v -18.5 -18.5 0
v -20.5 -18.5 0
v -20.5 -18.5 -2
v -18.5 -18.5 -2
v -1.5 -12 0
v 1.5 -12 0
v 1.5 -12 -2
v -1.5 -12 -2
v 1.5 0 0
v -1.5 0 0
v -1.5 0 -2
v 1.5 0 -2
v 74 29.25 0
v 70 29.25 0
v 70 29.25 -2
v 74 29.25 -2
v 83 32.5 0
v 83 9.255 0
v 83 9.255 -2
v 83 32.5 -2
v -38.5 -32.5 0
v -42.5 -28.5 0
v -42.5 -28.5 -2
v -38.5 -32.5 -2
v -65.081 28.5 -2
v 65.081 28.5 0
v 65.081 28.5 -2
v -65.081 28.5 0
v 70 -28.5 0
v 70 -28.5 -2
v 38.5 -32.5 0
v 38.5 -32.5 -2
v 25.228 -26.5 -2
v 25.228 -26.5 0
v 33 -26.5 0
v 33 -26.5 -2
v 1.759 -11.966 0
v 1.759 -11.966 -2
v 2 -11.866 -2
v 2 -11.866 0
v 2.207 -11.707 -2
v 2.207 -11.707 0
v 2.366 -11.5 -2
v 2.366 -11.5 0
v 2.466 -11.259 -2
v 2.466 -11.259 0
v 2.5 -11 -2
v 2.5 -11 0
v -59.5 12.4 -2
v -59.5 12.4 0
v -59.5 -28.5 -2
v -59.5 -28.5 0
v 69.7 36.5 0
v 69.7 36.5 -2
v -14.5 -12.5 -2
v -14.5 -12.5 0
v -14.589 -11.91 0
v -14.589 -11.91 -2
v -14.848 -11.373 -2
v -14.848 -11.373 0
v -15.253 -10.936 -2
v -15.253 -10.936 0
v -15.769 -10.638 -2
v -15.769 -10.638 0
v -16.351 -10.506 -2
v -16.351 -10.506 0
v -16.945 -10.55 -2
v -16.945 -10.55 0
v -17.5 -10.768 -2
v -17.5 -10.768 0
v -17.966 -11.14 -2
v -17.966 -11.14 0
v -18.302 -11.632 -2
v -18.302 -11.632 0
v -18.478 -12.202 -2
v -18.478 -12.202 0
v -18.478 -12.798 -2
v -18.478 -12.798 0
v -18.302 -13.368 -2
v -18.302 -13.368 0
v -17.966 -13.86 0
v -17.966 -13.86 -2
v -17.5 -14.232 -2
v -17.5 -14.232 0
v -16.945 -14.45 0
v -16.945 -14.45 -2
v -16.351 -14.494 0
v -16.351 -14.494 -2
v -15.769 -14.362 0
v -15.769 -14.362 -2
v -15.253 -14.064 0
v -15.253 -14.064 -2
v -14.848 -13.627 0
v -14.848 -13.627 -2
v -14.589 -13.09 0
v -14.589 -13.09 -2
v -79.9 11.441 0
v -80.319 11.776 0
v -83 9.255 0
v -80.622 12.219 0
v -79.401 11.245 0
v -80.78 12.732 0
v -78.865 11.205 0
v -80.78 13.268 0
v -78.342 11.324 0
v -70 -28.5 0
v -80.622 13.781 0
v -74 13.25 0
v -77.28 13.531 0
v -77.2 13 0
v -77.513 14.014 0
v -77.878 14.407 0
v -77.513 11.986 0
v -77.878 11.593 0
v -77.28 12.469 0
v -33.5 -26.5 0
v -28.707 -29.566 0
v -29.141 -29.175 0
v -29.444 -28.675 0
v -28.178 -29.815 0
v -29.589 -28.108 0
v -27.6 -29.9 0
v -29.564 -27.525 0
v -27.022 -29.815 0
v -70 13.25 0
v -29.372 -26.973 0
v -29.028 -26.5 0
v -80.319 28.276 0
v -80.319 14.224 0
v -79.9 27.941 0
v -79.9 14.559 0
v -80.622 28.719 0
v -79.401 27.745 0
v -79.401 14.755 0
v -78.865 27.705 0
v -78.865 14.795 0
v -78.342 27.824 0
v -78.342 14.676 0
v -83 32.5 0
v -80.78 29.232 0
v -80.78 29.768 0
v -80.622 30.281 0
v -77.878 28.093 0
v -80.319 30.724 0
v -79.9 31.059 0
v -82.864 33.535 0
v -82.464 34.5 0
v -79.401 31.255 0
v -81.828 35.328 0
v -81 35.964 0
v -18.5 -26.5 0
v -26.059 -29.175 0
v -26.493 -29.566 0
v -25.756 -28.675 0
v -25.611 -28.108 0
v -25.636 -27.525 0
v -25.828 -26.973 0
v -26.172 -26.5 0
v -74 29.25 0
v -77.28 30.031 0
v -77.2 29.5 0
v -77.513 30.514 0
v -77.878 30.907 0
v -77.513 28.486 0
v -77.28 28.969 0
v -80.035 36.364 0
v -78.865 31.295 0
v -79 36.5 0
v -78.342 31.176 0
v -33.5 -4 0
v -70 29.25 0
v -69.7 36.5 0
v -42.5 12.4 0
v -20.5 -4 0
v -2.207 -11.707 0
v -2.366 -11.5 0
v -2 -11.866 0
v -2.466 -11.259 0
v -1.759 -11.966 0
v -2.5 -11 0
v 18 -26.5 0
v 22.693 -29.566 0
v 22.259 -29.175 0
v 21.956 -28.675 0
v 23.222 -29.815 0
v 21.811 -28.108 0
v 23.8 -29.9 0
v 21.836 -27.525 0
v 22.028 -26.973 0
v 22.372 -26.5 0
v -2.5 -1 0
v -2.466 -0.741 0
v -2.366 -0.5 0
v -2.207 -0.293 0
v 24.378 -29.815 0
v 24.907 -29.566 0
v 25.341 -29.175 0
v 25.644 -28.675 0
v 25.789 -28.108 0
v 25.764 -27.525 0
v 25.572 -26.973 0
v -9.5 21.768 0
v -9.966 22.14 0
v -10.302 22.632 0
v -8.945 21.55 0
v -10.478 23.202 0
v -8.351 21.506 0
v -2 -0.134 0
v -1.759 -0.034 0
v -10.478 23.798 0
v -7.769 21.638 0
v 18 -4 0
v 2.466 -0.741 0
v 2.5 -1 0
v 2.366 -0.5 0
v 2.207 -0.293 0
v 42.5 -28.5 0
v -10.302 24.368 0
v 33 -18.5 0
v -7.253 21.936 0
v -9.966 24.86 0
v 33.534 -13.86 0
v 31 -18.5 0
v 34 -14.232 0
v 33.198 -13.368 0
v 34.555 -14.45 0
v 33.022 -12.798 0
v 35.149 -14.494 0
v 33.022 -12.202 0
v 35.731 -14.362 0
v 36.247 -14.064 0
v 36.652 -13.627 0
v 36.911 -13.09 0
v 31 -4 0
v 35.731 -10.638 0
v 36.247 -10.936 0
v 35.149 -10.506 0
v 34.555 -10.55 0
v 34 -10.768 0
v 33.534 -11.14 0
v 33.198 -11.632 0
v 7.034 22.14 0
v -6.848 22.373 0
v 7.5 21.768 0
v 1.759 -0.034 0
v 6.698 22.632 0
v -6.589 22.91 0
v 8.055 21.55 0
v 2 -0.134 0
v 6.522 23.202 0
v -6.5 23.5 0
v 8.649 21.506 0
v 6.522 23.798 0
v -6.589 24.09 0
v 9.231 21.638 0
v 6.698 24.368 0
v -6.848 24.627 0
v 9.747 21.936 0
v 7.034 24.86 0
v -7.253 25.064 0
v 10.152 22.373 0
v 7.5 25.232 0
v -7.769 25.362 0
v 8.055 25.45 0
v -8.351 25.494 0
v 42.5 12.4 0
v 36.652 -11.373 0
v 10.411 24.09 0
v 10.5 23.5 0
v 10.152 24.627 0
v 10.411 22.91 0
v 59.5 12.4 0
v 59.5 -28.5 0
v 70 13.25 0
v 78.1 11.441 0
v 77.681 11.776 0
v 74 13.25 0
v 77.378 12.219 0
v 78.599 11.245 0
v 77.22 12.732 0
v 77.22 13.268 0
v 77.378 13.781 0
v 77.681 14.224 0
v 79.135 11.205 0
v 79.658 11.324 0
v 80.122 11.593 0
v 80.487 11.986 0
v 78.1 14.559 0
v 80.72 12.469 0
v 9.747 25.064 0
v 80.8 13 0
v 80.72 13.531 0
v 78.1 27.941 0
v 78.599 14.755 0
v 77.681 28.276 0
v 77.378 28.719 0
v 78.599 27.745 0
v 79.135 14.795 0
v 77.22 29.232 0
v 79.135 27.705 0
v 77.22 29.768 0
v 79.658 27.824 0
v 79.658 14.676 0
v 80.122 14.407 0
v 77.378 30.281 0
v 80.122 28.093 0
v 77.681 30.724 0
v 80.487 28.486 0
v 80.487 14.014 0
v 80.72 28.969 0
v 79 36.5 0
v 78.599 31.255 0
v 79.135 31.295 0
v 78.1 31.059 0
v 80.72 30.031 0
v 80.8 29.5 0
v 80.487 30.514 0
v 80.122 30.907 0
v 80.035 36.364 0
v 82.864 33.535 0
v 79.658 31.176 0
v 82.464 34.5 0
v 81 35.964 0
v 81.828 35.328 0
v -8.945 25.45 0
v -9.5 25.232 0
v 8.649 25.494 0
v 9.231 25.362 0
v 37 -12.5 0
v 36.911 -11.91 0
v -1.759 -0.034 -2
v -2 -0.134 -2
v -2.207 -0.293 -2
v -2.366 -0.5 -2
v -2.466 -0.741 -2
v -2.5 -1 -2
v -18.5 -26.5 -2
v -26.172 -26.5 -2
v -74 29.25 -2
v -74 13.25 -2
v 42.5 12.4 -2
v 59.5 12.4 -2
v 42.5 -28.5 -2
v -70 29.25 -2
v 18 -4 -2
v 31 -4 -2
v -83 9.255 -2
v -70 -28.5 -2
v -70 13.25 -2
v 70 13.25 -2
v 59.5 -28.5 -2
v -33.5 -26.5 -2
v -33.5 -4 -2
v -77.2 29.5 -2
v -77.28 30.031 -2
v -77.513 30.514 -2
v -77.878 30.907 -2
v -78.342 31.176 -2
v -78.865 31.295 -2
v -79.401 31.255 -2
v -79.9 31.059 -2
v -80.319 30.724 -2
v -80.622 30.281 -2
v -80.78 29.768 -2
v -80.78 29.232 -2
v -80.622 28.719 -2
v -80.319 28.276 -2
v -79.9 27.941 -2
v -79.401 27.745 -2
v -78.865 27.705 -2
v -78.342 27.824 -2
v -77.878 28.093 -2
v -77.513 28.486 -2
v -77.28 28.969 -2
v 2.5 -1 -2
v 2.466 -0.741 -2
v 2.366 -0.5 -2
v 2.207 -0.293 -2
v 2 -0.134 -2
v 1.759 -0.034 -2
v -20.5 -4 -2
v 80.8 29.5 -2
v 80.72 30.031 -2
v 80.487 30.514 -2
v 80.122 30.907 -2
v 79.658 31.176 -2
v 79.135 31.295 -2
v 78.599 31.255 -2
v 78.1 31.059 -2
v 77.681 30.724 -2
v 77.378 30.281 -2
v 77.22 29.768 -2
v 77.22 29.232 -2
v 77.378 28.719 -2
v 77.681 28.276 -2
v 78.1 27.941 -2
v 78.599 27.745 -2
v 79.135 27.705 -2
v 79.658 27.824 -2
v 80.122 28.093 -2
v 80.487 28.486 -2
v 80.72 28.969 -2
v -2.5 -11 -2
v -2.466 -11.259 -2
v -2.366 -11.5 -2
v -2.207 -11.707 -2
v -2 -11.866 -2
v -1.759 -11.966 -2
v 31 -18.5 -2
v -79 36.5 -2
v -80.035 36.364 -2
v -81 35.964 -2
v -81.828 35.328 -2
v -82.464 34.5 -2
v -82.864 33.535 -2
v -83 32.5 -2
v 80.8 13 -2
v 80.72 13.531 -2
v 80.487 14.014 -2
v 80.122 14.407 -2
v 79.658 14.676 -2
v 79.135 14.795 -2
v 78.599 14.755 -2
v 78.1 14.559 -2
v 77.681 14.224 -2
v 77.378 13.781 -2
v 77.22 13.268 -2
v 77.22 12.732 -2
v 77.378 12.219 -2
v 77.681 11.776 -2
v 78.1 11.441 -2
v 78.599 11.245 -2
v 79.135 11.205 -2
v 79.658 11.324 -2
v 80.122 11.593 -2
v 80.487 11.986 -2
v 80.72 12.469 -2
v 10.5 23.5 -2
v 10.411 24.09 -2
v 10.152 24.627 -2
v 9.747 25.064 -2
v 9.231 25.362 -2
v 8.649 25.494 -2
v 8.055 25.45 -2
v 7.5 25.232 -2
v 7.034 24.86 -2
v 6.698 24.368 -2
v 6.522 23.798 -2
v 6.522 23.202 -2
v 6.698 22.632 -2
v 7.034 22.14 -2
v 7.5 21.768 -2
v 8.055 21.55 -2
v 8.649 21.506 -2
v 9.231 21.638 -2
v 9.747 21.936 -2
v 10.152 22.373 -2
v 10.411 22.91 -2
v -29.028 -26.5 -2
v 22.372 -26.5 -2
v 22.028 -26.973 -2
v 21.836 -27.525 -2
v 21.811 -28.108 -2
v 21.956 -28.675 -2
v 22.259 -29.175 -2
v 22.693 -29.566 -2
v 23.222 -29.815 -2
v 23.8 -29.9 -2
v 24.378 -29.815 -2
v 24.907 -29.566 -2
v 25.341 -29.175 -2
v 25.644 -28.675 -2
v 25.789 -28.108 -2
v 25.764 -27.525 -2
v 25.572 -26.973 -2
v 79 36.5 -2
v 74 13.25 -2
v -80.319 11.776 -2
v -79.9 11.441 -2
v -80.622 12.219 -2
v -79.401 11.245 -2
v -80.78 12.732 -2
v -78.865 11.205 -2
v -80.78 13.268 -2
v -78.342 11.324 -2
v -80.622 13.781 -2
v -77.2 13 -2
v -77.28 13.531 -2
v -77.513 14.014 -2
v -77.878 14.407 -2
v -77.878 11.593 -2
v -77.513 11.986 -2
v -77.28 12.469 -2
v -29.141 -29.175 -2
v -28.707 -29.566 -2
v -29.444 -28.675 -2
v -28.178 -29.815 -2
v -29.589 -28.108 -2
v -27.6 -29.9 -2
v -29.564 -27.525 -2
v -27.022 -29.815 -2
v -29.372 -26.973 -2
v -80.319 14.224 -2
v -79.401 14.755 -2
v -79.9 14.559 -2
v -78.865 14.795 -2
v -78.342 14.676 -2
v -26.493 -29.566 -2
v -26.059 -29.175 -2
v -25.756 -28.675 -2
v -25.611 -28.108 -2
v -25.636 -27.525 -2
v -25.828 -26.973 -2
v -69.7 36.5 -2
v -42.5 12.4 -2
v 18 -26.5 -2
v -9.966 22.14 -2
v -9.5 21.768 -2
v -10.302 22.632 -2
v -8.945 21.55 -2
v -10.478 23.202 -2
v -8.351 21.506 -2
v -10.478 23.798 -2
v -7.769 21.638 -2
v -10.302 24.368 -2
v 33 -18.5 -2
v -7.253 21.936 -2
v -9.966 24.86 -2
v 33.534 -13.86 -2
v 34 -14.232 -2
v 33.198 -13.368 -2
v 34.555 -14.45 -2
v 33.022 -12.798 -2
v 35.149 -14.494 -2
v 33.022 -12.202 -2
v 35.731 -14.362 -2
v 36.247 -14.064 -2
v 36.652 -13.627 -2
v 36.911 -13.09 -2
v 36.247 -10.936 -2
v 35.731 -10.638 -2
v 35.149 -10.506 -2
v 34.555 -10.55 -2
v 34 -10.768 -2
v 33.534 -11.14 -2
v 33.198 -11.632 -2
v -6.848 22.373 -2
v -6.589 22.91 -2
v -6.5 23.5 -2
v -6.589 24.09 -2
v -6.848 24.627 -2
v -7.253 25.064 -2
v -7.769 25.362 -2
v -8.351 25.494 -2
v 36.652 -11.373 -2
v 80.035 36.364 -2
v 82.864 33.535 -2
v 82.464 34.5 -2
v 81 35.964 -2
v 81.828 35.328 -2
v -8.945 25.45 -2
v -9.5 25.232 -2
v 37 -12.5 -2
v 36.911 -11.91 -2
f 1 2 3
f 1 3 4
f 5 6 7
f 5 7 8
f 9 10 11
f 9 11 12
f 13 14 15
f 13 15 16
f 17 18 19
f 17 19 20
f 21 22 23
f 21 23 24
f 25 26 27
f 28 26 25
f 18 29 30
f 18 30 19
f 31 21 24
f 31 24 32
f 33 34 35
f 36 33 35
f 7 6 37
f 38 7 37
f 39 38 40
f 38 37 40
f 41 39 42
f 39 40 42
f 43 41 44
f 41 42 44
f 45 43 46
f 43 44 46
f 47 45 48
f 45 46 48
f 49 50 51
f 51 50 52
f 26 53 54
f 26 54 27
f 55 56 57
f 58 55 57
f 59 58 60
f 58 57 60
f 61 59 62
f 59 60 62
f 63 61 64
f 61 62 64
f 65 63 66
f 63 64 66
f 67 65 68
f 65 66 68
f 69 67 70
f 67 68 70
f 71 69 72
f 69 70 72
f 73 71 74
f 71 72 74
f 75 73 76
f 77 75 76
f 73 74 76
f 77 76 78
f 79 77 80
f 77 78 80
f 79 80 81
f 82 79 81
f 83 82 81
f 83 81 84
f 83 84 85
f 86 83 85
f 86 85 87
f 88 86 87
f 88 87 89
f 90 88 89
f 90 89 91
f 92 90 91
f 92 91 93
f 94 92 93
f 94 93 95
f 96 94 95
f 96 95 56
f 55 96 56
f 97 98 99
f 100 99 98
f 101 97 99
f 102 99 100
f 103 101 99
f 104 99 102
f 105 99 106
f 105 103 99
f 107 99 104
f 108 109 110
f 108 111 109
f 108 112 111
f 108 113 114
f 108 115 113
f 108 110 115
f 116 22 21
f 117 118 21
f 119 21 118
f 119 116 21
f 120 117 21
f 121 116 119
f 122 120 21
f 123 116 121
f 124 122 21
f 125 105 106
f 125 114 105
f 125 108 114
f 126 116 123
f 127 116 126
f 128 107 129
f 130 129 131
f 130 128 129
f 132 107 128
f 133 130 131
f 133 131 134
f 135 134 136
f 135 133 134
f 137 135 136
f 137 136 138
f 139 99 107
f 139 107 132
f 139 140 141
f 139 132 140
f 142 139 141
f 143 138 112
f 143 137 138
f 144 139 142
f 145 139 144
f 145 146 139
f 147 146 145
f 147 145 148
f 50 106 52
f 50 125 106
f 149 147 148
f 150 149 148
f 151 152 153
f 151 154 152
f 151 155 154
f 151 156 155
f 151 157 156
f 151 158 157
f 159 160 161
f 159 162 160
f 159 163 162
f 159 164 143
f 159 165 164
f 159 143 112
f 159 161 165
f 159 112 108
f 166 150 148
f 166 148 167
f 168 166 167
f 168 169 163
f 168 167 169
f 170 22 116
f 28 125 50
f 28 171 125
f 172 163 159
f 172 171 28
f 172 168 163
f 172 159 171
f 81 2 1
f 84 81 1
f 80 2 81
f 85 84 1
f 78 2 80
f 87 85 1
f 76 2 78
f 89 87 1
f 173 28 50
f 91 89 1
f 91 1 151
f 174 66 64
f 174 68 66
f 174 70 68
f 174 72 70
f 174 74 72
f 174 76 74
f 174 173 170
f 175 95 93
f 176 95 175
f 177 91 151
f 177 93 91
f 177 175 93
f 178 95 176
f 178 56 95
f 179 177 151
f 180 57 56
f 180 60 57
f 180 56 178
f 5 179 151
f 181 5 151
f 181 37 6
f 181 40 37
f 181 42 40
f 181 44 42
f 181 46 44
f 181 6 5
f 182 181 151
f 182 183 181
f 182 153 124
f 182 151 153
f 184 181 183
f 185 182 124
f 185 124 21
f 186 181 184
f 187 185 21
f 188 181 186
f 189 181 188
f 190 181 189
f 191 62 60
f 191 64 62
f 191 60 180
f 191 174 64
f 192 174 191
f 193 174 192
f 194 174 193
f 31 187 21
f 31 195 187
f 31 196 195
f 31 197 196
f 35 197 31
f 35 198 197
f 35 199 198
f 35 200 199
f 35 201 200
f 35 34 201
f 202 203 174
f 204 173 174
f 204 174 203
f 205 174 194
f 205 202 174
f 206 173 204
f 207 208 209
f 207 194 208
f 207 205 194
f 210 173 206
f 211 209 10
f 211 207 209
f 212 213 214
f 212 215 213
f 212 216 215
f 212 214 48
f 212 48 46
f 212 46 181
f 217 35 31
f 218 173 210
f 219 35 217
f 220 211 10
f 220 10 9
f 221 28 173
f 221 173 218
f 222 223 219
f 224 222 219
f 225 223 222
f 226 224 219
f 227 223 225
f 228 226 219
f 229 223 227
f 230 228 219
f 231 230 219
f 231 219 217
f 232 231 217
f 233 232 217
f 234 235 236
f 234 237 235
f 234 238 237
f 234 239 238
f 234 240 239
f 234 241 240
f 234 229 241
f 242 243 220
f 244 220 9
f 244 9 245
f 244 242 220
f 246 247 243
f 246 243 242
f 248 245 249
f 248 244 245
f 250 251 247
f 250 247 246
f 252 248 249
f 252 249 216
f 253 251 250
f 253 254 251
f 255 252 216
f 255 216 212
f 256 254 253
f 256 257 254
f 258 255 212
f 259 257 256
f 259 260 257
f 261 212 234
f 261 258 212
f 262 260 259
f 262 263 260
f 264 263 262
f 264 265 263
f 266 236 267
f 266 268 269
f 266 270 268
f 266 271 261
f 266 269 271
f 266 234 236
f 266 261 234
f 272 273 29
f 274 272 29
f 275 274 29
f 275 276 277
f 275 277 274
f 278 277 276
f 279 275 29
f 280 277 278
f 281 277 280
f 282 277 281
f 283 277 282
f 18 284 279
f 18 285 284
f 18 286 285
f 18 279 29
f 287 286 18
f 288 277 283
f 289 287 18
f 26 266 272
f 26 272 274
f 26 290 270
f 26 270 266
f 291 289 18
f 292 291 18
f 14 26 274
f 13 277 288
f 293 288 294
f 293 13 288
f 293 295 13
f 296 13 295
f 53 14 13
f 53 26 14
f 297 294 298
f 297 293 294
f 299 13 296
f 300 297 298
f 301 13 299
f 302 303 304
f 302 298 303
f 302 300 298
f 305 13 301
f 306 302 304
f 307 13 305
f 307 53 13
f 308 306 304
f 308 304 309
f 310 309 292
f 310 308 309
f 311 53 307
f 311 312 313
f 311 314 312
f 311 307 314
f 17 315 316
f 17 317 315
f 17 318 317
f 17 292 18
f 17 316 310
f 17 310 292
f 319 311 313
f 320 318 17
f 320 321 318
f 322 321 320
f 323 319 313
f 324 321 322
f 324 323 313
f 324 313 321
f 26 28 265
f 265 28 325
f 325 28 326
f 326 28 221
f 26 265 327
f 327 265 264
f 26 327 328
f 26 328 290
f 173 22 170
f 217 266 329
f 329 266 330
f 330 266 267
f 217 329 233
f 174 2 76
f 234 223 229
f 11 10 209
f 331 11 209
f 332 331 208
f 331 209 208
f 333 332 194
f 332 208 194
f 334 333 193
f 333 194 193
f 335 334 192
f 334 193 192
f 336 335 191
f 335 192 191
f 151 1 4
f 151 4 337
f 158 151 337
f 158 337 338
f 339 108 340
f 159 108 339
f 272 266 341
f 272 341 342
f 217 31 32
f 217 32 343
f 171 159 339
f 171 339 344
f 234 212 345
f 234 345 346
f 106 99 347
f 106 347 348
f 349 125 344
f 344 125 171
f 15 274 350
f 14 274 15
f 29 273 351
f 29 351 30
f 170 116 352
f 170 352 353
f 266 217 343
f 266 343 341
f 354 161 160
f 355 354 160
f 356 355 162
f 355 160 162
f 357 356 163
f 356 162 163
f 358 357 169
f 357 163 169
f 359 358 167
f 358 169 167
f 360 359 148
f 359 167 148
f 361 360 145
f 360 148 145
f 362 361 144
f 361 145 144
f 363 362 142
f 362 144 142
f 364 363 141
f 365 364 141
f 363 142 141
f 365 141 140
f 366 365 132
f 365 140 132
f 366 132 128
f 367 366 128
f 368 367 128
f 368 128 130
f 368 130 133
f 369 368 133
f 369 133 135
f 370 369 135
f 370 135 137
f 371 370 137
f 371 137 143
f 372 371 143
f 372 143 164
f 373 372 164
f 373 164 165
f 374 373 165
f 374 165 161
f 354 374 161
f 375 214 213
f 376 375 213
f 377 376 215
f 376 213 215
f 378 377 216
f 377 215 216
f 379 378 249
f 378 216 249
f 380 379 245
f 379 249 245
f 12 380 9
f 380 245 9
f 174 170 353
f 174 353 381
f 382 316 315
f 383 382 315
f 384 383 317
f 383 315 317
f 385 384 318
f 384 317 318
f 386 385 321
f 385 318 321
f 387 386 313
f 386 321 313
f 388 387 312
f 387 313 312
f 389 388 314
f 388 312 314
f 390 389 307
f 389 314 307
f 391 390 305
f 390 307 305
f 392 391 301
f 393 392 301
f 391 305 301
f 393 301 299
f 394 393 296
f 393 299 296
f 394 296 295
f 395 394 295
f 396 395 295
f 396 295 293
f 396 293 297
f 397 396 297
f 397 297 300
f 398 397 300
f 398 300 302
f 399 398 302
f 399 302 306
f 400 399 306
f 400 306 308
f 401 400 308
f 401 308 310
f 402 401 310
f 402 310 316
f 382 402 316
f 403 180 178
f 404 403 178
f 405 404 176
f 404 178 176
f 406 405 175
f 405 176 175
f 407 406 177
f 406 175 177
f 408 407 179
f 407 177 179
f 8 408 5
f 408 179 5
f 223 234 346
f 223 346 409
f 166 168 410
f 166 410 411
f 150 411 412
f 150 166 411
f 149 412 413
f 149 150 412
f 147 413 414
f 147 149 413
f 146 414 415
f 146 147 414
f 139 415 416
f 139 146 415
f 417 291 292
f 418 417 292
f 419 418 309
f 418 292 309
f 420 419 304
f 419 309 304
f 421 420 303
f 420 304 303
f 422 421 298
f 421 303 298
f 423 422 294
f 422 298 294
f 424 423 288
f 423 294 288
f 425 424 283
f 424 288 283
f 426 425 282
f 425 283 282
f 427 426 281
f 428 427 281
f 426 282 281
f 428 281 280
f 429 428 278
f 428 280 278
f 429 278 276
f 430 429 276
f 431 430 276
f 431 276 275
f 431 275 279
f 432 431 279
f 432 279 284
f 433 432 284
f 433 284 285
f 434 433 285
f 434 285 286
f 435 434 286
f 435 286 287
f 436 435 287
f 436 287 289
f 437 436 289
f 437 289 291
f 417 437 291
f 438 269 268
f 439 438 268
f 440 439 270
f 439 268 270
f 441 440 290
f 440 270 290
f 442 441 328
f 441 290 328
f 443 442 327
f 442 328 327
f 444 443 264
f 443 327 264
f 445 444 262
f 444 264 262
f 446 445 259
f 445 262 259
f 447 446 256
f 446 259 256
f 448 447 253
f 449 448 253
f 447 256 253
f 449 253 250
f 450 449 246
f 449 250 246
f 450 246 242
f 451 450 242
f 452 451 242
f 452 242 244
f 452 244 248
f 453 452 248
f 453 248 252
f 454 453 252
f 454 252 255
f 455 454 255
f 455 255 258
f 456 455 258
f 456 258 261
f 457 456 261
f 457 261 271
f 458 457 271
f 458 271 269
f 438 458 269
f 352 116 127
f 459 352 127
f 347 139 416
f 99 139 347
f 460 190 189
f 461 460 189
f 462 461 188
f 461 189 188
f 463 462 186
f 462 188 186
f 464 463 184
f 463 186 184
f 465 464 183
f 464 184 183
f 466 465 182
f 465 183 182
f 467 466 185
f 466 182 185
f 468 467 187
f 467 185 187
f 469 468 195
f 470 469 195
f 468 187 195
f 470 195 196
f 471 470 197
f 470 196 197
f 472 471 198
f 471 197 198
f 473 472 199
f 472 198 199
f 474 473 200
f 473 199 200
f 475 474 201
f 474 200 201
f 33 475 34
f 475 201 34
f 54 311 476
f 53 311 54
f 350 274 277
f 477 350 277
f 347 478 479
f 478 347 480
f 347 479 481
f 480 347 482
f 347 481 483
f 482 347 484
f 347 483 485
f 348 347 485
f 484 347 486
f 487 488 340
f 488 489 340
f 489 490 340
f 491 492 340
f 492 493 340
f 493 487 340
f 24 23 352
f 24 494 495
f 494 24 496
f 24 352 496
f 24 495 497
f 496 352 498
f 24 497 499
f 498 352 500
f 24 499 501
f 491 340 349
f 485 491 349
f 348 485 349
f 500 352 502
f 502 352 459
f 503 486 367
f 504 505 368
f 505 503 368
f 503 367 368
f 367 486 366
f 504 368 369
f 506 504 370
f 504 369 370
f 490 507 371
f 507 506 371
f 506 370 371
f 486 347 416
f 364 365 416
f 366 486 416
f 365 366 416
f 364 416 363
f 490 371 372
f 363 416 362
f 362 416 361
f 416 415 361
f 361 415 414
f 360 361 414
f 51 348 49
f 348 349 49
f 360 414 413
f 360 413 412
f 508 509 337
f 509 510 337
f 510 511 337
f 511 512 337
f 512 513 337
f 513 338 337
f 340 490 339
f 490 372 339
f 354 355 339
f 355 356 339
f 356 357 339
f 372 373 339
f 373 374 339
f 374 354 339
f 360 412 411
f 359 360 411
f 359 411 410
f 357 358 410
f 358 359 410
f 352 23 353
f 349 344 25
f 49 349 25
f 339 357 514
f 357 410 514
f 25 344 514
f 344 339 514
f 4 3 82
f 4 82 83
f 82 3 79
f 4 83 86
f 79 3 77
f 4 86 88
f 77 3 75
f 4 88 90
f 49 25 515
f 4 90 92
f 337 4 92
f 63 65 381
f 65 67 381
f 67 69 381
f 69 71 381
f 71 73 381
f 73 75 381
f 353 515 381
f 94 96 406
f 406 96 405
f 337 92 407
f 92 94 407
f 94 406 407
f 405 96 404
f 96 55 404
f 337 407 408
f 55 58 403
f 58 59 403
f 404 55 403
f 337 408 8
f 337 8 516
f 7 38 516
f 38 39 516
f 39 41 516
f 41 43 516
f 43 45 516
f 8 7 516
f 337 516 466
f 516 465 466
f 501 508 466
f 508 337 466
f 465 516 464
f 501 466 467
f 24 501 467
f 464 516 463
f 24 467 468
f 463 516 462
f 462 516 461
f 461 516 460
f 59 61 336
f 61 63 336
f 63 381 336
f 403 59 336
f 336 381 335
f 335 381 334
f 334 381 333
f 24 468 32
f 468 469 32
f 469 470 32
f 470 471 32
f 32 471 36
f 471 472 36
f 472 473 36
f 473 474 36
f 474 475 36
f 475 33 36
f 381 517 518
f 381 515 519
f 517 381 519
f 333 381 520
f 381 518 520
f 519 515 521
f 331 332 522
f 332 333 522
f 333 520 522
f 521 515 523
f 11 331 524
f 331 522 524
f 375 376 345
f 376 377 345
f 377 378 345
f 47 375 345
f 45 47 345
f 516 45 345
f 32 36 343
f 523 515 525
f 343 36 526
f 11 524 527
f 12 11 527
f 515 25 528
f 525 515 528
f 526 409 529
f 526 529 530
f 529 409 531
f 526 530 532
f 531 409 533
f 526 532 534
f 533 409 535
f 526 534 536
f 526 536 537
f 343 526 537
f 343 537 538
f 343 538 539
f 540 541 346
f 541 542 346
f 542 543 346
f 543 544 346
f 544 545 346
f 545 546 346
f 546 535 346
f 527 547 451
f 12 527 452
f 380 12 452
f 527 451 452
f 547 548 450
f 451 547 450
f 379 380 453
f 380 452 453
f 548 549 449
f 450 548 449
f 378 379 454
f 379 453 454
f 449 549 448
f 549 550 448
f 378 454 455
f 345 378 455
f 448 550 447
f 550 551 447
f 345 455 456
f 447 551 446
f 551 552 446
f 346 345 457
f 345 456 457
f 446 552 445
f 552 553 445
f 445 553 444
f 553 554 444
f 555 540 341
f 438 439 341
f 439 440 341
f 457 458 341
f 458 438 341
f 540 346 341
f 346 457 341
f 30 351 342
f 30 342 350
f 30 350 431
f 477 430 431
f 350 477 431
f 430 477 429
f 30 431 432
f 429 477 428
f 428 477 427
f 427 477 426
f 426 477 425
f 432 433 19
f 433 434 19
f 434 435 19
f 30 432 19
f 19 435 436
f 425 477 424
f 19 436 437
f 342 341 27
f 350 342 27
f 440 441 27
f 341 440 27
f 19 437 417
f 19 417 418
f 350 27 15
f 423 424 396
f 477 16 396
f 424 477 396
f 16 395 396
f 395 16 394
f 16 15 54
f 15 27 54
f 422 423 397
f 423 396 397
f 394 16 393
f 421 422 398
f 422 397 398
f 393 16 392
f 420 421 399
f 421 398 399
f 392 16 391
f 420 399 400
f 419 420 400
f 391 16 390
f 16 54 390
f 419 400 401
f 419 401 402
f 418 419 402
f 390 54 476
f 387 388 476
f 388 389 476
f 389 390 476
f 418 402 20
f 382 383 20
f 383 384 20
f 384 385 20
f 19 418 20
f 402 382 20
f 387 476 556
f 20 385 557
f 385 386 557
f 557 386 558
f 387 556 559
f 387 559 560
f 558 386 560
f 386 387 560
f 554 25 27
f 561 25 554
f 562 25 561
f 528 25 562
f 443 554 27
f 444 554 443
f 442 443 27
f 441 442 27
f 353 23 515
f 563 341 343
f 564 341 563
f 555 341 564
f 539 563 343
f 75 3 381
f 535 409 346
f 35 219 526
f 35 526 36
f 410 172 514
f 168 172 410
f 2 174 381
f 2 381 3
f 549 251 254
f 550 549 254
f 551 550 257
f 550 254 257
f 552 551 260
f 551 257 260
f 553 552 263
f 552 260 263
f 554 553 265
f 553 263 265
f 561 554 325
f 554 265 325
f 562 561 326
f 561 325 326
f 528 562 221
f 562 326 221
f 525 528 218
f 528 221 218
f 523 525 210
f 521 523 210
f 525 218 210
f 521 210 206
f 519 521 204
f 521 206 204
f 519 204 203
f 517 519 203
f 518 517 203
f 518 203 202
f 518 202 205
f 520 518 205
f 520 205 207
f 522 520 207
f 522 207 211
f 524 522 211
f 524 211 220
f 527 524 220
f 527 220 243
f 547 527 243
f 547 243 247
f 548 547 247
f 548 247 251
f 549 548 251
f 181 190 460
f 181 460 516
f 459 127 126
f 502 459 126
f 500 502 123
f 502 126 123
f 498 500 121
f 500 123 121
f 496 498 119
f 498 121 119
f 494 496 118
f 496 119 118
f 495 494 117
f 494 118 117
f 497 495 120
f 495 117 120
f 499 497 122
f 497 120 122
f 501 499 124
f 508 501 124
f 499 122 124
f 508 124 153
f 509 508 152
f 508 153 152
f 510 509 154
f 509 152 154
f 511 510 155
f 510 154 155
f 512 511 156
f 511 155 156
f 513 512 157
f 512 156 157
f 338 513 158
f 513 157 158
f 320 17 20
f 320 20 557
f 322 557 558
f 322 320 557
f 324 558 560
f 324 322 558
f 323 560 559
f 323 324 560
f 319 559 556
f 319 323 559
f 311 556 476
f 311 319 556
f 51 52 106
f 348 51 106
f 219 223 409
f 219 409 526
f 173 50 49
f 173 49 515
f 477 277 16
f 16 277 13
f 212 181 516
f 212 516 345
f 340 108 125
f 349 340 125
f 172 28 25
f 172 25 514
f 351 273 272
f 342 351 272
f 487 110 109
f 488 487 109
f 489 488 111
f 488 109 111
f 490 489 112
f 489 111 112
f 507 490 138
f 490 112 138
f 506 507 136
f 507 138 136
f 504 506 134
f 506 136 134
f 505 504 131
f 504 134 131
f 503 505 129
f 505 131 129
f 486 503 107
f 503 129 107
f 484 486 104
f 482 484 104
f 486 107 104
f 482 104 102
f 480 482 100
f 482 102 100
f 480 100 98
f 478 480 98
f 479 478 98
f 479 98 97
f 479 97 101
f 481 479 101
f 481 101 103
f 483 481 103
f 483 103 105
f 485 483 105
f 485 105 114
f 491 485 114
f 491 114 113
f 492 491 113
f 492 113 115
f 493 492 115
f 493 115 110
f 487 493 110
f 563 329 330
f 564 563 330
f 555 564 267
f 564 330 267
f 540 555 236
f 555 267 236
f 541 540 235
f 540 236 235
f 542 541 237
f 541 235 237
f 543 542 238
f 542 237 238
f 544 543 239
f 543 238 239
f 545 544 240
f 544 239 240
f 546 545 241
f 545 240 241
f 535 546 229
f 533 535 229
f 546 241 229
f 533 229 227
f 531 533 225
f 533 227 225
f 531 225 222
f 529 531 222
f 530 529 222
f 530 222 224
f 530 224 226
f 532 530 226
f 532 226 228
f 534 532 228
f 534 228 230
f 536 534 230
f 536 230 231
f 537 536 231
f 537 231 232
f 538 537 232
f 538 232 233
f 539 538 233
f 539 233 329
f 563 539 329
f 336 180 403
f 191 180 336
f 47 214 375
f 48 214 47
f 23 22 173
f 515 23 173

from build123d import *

# Parameters (mm, degrees)
PAD_DEPTH          = 2
SKETCH001_R        = 1.8
SKETCH001_W        = 4
SKETCH001_H        = 16
POCKET_DEPTH       = 2.001
SKETCH002_R        = 2
POCKET001_DEPTH    = 2.001
SKETCH003_W        = 17
SKETCH003_H        = 43.9
POCKET002_DEPTH    = 2.001
SKETCH004_R        = 2
POCKET003_DEPTH    = 2.001
POCKET011002_DEPTH = 2.001


with BuildPart() as part:
    # Sketch → Pad (new body)
    with BuildSketch(Plane.XY):
        with BuildLine():
            Line((65.081198, 28.5), (-65.081198, 28.5))
            Line((-65.081198, 28.5), (-69.7, 36.5))
            Line((-69.7, 36.5), (-79, 36.5))
            ThreePointArc((-79, 36.5), (-81.828427, 35.328427), (-83, 32.5))
            Line((-83, 32.5), (-83, 9.254741))
            Line((-83, 9.254741), (-70, -28.5))
            Line((-42.5, -28.5), (-70, -28.5))
            Line((-42.5, -28.5), (-38.5, -32.5))
            Line((-38.5, -32.5), (38.5, -32.5))
            Line((38.5, -32.5), (42.5, -28.5))
            Line((42.5, -28.5), (70, -28.5))
            Line((70, -28.5), (83, 9.254741))
            Line((83, 9.254741), (83, 32.5))
            ThreePointArc((83, 32.5), (81.828427, 35.328427), (79, 36.5))
            Line((79, 36.5), (69.7, 36.5))
            Line((69.7, 36.5), (65.081198, 28.5))
        make_face()
    extrude(amount=-PAD_DEPTH)

    # Sketch001 → Pocket (cut, through all)
    with BuildSketch(Plane.XY):
        with Locations((-79, 29.5)):
            Circle(SKETCH001_R)
        with Locations((-79, 13)):
            Circle(SKETCH001_R)
        with Locations((79, 29.5)):
            Circle(SKETCH001_R)
        with Locations((79, 13)):
            Circle(SKETCH001_R)
        with Locations((-72, 21.25)):
            Rectangle(SKETCH001_W, SKETCH001_H)
        with Locations((72, 21.25)):
            Rectangle(SKETCH001_W, SKETCH001_H)
    extrude(amount=-POCKET_DEPTH, mode=Mode.SUBTRACT)

    # Sketch002 → Pocket001 (cut, through all)
    with BuildSketch(Plane.XY):
        with Locations((-16.5, -12.5)):
            Circle(SKETCH002_R)
        with Locations((35, -12.5)):
            Circle(SKETCH002_R)
        with BuildLine():
            Line((-33.5, -4), (-20.5, -4))
            Line((-20.5, -4), (-20.5, -18.5))
            Line((-20.5, -18.5), (-18.5, -18.5))
            Line((-18.5, -18.5), (-18.5, -26.5))
            Line((-18.5, -26.5), (-26.171714, -26.5))
            ThreePointArc((-29.028286, -26.5), (-27.6, -29.9), (-26.171714, -26.5))
            Line((-33.5, -26.5), (-29.028286, -26.5))
            Line((-33.5, -26.5), (-33.5, -4))
        make_face()
        with BuildLine():
            Line((18, -4), (31, -4))
            Line((31, -4), (31, -18.5))
            Line((31, -18.5), (33, -18.5))
            Line((33, -18.5), (33, -26.5))
            Line((25.228286, -26.5), (33, -26.5))
            ThreePointArc((22.371714, -26.5), (23.8, -29.9), (25.228286, -26.5))
            Line((22.371714, -26.5), (18, -26.5))
            Line((18, -26.5), (18, -4))
        make_face()
    extrude(amount=-POCKET001_DEPTH, mode=Mode.SUBTRACT)

    # Sketch003 → Pocket002 (cut, through all)
    with BuildSketch(Plane.XY):
        Polygon((-59.5, 12.4), (-42.5, 12.4), (-42.5, -28.5), (-42.5, -31.5), (-59.5, -31.5), (-59.5, -28.5), align=None)
        with Locations((51, -9.55)):
            Rectangle(SKETCH003_W, SKETCH003_H)
    extrude(amount=-POCKET002_DEPTH, mode=Mode.SUBTRACT)

    # Sketch004 → Pocket003 (cut, through all)
    with BuildSketch(Plane.XY):
        with Locations((-8.5, 23.5)):
            Circle(SKETCH004_R)
        with Locations((8.5, 23.5)):
            Circle(SKETCH004_R)
    extrude(amount=-POCKET003_DEPTH, mode=Mode.SUBTRACT)

    # Sketch016 → Pocket011002 (cut, through all)
    with BuildSketch(Plane.XY):
        with BuildLine():
            Line((-1.5, 0), (1.5, 0))
            ThreePointArc((2.5, -1), (2.207107, -0.292893), (1.5, 0))
            Line((2.5, -1), (2.5, -11))
            ThreePointArc((1.5, -12), (2.207107, -11.707107), (2.5, -11))
            Line((1.5, -12), (-1.5, -12))
            ThreePointArc((-2.5, -11), (-2.207107, -11.707107), (-1.5, -12))
            Line((-2.5, -11), (-2.5, -1))
            ThreePointArc((-1.5, 0), (-2.207107, -0.292893), (-2.5, -1))
        make_face()
    extrude(amount=-POCKET011002_DEPTH, mode=Mode.SUBTRACT)


solid = part.part
